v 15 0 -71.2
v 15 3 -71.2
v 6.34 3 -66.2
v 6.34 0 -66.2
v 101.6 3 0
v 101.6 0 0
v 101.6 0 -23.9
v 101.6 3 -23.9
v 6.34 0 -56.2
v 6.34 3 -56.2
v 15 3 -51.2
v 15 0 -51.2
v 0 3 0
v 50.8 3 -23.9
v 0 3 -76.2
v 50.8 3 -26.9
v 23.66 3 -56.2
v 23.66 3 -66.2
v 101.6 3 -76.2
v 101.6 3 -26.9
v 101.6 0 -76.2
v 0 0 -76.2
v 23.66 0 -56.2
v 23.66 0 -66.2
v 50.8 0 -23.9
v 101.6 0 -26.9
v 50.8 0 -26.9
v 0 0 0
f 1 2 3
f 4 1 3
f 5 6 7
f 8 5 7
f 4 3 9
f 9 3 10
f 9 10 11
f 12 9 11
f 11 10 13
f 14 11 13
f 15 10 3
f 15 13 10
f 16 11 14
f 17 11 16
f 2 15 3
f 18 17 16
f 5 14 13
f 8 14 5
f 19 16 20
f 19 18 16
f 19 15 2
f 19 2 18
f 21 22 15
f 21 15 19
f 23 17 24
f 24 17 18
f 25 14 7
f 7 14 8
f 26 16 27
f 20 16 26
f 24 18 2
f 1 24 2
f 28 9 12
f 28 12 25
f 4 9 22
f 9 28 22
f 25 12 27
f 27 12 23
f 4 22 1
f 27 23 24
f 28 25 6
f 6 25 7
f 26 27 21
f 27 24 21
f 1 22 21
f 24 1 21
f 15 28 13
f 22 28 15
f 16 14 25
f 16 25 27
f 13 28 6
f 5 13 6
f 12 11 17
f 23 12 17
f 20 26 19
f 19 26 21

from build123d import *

# Parameters (mm, degrees)
SKETCH1_W           = 101.6
SKETCH1_H           = 76.2
BOSS_EXTRUDE1_DEPTH = 3
SKETCH2_W           = 50.8
SKETCH2_H           = 3
CUT_EXTRUDE1_DEPTH  = 3
CUT_EXTRUDE2_DEPTH  = 3


with BuildPart() as part:
    # Sketch1 → Boss-Extrude1 (new body)
    with BuildSketch(Plane(origin=(0, 0, 0), x_dir=(1, 0, 0), z_dir=(0, 1, 0))):
        with Locations((50.8, 38.1)):
            Rectangle(SKETCH1_W, SKETCH1_H)
    extrude(amount=BOSS_EXTRUDE1_DEPTH)

    # Sketch2 → Cut-Extrude1 (cut)
    with BuildSketch(Plane(origin=(0, 3, 0), x_dir=(1, 0, 0), z_dir=(0, 1, 0))):
        with Locations((76.2, 25.4)):
            Rectangle(SKETCH2_W, SKETCH2_H)
    extrude(amount=-CUT_EXTRUDE1_DEPTH, mode=Mode.SUBTRACT)

    # Sketch3 → Cut-Extrude2 (cut)
    with BuildSketch(Plane(origin=(0, 3, 0), x_dir=(1, 0, 0), z_dir=(0, 1, 0))):
        Polygon((15, 51.2), (23.660254038, 56.2), (23.660254038, 66.2), (15, 71.2), (6.339745962, 66.2), (6.339745962, 56.2), align=None)
    extrude(amount=-CUT_EXTRUDE2_DEPTH, mode=Mode.SUBTRACT)


solid = part.part
